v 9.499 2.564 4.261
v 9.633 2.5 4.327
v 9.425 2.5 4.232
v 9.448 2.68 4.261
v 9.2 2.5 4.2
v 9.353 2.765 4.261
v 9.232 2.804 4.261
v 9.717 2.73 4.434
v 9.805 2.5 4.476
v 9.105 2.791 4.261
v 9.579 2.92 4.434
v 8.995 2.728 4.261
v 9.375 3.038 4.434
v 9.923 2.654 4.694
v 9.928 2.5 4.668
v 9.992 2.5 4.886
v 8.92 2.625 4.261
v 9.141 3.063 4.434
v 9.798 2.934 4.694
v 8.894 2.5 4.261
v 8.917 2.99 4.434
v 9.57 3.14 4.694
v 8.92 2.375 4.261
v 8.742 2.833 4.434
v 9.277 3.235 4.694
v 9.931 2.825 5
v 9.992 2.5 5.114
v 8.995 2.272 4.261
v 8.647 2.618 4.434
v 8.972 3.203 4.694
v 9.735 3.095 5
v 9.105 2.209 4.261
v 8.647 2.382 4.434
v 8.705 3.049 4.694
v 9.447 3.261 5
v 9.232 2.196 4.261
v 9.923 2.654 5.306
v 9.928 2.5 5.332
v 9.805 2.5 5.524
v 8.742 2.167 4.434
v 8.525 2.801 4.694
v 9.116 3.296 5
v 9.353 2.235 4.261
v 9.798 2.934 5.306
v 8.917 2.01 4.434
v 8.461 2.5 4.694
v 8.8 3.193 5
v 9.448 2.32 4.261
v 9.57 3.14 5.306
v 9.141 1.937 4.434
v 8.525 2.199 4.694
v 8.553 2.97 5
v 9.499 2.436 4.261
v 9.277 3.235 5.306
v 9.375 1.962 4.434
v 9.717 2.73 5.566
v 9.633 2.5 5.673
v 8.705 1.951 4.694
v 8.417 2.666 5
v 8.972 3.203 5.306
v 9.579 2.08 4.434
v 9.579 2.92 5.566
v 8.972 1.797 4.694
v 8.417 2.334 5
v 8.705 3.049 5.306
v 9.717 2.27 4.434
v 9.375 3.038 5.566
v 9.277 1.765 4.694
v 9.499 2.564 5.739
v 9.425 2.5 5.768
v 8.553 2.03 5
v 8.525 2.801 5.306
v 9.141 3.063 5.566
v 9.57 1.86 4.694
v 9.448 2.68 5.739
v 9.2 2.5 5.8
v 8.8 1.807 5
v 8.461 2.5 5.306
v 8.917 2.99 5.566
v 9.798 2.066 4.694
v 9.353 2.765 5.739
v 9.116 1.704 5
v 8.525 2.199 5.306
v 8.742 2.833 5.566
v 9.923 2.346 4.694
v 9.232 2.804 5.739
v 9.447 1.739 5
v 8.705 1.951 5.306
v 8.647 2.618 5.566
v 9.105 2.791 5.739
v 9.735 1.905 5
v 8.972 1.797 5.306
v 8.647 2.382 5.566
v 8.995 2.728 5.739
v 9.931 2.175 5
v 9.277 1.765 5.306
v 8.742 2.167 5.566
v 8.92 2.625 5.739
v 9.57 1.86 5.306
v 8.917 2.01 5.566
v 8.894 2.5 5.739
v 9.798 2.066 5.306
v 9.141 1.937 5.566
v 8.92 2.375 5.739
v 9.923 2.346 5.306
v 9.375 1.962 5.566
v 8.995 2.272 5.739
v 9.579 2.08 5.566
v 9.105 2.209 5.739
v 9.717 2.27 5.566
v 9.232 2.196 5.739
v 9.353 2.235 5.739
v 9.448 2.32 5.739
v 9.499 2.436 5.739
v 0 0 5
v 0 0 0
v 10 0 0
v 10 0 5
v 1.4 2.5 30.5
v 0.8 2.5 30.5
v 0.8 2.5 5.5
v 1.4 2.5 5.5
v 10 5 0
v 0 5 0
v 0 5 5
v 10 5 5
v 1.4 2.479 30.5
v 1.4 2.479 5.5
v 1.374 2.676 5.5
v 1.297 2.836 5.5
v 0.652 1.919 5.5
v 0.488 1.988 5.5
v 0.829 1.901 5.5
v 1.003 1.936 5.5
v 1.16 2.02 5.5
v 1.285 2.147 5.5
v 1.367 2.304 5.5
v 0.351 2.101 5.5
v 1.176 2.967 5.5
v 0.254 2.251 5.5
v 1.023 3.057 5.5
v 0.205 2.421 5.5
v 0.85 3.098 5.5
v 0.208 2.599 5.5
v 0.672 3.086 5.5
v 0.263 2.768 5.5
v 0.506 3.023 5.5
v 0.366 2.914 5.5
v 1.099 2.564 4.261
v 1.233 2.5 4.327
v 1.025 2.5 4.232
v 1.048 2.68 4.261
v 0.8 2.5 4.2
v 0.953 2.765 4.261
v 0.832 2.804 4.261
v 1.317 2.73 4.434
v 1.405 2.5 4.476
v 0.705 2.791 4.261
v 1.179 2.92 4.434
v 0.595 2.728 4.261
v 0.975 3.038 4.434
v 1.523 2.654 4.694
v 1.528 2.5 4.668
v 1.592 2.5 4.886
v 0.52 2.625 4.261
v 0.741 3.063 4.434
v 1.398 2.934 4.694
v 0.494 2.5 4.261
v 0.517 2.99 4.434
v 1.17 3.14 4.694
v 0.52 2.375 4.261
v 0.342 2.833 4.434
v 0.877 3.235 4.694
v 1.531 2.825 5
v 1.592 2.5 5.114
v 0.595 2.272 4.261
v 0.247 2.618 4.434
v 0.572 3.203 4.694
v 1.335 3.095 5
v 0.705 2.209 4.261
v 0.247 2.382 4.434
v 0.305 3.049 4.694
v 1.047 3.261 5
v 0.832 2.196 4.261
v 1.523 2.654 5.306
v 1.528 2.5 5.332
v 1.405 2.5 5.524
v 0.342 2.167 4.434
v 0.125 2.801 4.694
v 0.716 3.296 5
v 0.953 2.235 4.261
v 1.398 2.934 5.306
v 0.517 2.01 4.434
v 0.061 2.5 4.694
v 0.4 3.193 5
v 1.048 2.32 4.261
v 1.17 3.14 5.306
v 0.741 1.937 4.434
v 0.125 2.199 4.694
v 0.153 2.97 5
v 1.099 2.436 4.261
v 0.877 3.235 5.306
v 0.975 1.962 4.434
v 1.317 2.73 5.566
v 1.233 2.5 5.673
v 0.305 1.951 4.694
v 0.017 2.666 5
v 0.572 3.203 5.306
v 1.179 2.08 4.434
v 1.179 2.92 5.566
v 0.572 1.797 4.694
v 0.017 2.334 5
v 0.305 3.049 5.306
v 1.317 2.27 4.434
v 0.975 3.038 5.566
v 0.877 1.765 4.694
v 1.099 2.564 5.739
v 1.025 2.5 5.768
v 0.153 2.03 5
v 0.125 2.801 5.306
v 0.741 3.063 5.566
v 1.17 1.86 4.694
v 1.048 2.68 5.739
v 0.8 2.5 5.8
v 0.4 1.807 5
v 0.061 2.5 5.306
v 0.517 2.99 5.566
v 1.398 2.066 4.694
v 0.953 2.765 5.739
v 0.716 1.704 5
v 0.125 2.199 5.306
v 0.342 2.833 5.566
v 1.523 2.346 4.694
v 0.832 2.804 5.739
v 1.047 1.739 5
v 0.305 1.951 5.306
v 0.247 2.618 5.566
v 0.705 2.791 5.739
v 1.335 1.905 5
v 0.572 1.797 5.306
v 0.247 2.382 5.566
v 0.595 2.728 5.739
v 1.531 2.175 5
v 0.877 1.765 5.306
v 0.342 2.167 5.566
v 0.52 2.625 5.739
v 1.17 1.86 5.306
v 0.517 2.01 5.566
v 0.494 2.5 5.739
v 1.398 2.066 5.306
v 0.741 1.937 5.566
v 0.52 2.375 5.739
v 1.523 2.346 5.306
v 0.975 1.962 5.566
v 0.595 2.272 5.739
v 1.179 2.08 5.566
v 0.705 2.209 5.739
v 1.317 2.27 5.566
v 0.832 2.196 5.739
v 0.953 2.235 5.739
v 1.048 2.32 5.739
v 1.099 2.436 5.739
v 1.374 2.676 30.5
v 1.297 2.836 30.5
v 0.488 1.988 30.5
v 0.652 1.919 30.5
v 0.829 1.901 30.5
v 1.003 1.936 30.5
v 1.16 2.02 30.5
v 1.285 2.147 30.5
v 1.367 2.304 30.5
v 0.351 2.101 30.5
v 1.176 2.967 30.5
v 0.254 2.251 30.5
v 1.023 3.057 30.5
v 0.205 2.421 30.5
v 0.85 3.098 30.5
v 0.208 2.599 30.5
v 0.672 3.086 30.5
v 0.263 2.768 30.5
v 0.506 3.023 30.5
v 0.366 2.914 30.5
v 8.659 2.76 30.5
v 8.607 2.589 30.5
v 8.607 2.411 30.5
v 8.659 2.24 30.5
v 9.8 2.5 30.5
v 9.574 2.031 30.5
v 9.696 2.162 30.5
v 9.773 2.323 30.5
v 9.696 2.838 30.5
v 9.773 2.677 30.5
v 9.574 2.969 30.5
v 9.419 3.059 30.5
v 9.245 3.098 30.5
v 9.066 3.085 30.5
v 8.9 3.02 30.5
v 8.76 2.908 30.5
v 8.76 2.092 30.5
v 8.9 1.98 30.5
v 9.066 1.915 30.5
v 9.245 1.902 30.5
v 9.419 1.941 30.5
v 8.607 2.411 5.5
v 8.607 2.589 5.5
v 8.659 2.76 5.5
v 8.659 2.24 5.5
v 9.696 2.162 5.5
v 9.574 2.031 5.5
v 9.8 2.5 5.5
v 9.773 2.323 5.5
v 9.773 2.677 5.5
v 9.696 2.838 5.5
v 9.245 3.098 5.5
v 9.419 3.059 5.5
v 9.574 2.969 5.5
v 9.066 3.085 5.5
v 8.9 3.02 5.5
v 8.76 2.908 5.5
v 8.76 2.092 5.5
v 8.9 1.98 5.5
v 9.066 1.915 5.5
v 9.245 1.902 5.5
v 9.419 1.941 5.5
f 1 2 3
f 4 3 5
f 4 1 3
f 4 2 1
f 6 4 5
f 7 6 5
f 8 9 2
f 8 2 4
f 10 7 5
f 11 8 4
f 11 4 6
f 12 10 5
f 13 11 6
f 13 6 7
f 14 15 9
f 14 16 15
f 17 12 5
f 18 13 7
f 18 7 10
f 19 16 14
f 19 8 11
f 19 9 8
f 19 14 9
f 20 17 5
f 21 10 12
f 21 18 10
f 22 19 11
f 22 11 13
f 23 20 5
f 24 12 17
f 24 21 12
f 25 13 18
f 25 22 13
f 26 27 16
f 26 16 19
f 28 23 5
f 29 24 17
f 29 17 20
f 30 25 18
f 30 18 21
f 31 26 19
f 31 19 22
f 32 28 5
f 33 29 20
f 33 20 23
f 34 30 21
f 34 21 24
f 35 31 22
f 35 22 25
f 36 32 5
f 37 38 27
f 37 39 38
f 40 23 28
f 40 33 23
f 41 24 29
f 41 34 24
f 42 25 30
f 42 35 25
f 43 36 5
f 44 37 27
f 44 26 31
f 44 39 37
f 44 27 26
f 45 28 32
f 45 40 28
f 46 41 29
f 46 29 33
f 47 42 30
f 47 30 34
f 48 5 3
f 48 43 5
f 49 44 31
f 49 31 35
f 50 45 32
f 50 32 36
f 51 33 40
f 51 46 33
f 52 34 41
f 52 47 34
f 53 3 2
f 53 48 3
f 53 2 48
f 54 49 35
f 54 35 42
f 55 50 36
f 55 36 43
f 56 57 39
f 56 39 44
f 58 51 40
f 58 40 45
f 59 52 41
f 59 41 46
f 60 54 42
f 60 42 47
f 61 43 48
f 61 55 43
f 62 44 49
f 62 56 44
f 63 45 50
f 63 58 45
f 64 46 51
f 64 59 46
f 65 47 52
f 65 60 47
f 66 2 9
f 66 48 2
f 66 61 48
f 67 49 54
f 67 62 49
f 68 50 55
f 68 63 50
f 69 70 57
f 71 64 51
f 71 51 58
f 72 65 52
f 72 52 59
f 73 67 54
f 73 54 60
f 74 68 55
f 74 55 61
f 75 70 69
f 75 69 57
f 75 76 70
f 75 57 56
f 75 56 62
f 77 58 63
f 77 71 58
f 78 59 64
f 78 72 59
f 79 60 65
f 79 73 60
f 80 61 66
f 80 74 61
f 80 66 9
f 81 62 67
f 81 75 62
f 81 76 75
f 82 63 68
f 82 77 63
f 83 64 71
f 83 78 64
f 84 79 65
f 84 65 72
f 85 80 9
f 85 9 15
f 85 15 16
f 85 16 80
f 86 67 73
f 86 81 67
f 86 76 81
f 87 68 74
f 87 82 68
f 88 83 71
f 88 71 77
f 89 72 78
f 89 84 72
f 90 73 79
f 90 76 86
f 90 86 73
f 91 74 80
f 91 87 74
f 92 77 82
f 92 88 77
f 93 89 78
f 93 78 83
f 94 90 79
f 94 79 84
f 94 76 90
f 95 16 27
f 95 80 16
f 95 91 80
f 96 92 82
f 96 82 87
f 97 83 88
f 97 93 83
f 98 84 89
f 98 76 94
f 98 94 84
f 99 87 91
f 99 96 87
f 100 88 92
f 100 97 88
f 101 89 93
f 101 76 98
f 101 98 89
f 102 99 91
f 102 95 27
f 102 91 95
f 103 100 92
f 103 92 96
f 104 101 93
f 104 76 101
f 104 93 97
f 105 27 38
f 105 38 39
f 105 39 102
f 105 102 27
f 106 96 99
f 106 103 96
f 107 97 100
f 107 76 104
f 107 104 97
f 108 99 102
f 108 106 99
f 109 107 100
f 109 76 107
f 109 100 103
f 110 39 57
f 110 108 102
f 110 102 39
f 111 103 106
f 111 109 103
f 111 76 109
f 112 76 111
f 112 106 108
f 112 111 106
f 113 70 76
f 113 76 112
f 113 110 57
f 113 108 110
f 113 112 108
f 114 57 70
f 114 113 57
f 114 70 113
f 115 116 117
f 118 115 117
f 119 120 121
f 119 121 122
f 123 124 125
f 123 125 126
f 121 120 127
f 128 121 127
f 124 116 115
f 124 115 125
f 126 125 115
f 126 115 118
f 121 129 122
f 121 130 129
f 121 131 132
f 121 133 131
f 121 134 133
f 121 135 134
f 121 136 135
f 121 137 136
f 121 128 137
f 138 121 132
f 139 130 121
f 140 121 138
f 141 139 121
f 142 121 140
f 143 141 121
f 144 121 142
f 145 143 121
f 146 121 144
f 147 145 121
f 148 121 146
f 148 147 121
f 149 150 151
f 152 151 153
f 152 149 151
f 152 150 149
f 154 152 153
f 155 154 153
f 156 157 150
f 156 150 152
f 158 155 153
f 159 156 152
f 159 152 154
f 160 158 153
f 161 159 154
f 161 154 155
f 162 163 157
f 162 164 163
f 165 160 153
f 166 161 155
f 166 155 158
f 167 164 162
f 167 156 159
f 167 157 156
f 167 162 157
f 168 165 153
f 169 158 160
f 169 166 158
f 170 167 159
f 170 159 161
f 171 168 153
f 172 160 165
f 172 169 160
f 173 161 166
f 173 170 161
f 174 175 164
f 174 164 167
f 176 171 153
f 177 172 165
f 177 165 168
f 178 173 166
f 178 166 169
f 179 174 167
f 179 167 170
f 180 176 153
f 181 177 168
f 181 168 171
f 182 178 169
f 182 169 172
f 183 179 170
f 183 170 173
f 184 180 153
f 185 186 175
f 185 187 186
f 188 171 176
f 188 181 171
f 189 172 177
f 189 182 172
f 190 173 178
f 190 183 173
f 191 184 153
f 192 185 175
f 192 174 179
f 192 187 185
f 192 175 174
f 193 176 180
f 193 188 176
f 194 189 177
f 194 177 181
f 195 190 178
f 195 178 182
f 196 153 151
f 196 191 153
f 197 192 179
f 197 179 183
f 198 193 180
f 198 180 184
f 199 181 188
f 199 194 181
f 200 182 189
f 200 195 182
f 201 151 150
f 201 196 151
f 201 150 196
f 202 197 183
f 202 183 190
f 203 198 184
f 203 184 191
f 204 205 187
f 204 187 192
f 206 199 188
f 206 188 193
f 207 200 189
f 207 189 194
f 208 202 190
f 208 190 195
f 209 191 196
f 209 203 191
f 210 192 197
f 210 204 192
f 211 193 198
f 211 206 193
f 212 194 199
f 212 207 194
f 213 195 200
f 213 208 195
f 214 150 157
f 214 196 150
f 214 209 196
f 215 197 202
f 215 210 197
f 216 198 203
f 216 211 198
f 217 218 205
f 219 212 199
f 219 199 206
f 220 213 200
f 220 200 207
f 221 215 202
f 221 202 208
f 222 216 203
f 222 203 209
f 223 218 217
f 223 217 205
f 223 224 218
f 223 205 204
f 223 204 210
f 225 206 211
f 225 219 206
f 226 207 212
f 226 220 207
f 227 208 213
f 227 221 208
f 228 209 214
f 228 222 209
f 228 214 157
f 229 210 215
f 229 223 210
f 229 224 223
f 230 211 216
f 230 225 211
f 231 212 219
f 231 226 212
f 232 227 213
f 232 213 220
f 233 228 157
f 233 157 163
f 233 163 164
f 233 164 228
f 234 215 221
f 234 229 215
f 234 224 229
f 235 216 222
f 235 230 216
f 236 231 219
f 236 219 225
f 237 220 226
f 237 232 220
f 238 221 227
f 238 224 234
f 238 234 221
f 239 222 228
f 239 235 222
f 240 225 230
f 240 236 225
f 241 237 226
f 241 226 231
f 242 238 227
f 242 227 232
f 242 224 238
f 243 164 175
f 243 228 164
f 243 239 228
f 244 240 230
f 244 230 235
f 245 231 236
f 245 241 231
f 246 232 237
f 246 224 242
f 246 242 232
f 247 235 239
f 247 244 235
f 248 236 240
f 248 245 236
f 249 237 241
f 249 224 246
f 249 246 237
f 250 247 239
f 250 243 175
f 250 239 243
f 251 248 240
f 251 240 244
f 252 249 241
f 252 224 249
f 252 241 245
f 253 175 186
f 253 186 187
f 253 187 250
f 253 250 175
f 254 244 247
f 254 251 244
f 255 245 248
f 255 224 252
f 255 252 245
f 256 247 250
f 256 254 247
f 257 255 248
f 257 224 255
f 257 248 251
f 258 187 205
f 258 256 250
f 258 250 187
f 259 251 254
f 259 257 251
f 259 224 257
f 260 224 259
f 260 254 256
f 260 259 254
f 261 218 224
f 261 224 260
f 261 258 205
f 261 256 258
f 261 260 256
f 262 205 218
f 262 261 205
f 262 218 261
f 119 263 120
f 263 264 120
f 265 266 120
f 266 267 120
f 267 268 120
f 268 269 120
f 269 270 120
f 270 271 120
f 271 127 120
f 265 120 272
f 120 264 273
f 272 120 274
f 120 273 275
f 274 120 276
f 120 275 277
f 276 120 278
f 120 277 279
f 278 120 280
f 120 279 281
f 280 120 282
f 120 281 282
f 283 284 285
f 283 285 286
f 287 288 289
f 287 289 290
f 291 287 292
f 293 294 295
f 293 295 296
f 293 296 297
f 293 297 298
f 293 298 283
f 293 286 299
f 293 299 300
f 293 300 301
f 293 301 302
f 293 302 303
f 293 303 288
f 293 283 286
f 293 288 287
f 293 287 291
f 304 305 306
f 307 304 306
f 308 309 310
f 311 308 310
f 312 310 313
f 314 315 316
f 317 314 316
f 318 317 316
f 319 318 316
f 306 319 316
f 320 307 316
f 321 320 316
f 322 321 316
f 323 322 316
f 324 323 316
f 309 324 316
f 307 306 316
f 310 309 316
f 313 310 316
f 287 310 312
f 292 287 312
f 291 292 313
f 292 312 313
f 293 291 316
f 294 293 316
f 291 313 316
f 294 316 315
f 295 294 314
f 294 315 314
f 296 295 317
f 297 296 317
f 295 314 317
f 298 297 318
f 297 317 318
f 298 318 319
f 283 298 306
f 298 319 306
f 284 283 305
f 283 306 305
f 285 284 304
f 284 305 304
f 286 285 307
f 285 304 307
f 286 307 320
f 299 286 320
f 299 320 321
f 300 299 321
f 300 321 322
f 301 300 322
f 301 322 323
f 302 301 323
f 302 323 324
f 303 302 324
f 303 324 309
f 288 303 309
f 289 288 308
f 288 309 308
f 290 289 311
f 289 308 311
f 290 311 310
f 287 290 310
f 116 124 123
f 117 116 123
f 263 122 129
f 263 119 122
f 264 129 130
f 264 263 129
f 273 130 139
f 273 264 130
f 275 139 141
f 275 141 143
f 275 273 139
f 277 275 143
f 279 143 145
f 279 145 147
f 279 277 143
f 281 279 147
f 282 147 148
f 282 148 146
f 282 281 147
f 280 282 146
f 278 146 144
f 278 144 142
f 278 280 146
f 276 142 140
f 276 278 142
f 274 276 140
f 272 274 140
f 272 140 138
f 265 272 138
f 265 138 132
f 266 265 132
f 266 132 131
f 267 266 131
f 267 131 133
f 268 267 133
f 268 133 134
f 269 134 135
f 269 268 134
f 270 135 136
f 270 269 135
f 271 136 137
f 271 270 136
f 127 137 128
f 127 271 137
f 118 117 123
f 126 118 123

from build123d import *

# Parameters (mm, degrees)
BOX_W             = 10
BOX_H             = 5
BOX_DEPTH         = 5
CYLINDER_R        = 0.6
CYLINDER_DEPTH    = 25
CYLINDER001_W     = 0.6
CYLINDER001_H     = 25
CYLINDER001_ANGLE = 358


with BuildPart() as body:
    # Box → Box (join)
    with BuildSketch(Plane.XY):
        with Locations((5, 2.5)):
            Rectangle(BOX_W, BOX_H)
    extrude(amount=BOX_DEPTH)


with BuildPart() as body001:
    # Sphere → Sphere (revolve)
    with BuildSketch(Plane(origin=(0.8, 2.5, 5), x_dir=(1, 0, 0), z_dir=(0, -1, 0))):
        with BuildLine():
            ThreePointArc((0, -0.8), (0.8, 0), (0, 0.8))
            Line((0, 0.8), (0, -0.8))
        make_face()
    revolve(axis=Axis((0.8, 2.5, 5), (0, 0, 1)))

    # Sphere001 → Sphere001 (revolve)
    with BuildSketch(Plane(origin=(9.2, 2.5, 5), x_dir=(1, 0, 0), z_dir=(0, -1, 0))):
        with BuildLine():
            ThreePointArc((0, -0.8), (0.8, 0), (0, 0.8))
            Line((0, 0.8), (0, -0.8))
        make_face()
    revolve(axis=Axis((9.2, 2.5, 5), (0, 0, 1)))


with BuildPart() as body003:
    # Cylinder → Cylinder (join)
    with BuildSketch(Plane(origin=(9.2, 2.5, 5.5), x_dir=(1, 0, 0), z_dir=(0, 0, 1))):
        Circle(CYLINDER_R)
    extrude(amount=CYLINDER_DEPTH)

    # Cylinder001 → Cylinder001 (revolve)
    with BuildSketch(Plane(origin=(0.8, 2.5, 5.5), x_dir=(1, 0, 0), z_dir=(0, -1, 0))):
        with Locations((0.3, 12.5)):
            Rectangle(CYLINDER001_W, CYLINDER001_H)
    revolve(axis=Axis((0.8, 2.5, 5.5), (0, 0, 1)), revolution_arc=CYLINDER001_ANGLE)


solid = Compound([body.part, body001.part, body003.part])
